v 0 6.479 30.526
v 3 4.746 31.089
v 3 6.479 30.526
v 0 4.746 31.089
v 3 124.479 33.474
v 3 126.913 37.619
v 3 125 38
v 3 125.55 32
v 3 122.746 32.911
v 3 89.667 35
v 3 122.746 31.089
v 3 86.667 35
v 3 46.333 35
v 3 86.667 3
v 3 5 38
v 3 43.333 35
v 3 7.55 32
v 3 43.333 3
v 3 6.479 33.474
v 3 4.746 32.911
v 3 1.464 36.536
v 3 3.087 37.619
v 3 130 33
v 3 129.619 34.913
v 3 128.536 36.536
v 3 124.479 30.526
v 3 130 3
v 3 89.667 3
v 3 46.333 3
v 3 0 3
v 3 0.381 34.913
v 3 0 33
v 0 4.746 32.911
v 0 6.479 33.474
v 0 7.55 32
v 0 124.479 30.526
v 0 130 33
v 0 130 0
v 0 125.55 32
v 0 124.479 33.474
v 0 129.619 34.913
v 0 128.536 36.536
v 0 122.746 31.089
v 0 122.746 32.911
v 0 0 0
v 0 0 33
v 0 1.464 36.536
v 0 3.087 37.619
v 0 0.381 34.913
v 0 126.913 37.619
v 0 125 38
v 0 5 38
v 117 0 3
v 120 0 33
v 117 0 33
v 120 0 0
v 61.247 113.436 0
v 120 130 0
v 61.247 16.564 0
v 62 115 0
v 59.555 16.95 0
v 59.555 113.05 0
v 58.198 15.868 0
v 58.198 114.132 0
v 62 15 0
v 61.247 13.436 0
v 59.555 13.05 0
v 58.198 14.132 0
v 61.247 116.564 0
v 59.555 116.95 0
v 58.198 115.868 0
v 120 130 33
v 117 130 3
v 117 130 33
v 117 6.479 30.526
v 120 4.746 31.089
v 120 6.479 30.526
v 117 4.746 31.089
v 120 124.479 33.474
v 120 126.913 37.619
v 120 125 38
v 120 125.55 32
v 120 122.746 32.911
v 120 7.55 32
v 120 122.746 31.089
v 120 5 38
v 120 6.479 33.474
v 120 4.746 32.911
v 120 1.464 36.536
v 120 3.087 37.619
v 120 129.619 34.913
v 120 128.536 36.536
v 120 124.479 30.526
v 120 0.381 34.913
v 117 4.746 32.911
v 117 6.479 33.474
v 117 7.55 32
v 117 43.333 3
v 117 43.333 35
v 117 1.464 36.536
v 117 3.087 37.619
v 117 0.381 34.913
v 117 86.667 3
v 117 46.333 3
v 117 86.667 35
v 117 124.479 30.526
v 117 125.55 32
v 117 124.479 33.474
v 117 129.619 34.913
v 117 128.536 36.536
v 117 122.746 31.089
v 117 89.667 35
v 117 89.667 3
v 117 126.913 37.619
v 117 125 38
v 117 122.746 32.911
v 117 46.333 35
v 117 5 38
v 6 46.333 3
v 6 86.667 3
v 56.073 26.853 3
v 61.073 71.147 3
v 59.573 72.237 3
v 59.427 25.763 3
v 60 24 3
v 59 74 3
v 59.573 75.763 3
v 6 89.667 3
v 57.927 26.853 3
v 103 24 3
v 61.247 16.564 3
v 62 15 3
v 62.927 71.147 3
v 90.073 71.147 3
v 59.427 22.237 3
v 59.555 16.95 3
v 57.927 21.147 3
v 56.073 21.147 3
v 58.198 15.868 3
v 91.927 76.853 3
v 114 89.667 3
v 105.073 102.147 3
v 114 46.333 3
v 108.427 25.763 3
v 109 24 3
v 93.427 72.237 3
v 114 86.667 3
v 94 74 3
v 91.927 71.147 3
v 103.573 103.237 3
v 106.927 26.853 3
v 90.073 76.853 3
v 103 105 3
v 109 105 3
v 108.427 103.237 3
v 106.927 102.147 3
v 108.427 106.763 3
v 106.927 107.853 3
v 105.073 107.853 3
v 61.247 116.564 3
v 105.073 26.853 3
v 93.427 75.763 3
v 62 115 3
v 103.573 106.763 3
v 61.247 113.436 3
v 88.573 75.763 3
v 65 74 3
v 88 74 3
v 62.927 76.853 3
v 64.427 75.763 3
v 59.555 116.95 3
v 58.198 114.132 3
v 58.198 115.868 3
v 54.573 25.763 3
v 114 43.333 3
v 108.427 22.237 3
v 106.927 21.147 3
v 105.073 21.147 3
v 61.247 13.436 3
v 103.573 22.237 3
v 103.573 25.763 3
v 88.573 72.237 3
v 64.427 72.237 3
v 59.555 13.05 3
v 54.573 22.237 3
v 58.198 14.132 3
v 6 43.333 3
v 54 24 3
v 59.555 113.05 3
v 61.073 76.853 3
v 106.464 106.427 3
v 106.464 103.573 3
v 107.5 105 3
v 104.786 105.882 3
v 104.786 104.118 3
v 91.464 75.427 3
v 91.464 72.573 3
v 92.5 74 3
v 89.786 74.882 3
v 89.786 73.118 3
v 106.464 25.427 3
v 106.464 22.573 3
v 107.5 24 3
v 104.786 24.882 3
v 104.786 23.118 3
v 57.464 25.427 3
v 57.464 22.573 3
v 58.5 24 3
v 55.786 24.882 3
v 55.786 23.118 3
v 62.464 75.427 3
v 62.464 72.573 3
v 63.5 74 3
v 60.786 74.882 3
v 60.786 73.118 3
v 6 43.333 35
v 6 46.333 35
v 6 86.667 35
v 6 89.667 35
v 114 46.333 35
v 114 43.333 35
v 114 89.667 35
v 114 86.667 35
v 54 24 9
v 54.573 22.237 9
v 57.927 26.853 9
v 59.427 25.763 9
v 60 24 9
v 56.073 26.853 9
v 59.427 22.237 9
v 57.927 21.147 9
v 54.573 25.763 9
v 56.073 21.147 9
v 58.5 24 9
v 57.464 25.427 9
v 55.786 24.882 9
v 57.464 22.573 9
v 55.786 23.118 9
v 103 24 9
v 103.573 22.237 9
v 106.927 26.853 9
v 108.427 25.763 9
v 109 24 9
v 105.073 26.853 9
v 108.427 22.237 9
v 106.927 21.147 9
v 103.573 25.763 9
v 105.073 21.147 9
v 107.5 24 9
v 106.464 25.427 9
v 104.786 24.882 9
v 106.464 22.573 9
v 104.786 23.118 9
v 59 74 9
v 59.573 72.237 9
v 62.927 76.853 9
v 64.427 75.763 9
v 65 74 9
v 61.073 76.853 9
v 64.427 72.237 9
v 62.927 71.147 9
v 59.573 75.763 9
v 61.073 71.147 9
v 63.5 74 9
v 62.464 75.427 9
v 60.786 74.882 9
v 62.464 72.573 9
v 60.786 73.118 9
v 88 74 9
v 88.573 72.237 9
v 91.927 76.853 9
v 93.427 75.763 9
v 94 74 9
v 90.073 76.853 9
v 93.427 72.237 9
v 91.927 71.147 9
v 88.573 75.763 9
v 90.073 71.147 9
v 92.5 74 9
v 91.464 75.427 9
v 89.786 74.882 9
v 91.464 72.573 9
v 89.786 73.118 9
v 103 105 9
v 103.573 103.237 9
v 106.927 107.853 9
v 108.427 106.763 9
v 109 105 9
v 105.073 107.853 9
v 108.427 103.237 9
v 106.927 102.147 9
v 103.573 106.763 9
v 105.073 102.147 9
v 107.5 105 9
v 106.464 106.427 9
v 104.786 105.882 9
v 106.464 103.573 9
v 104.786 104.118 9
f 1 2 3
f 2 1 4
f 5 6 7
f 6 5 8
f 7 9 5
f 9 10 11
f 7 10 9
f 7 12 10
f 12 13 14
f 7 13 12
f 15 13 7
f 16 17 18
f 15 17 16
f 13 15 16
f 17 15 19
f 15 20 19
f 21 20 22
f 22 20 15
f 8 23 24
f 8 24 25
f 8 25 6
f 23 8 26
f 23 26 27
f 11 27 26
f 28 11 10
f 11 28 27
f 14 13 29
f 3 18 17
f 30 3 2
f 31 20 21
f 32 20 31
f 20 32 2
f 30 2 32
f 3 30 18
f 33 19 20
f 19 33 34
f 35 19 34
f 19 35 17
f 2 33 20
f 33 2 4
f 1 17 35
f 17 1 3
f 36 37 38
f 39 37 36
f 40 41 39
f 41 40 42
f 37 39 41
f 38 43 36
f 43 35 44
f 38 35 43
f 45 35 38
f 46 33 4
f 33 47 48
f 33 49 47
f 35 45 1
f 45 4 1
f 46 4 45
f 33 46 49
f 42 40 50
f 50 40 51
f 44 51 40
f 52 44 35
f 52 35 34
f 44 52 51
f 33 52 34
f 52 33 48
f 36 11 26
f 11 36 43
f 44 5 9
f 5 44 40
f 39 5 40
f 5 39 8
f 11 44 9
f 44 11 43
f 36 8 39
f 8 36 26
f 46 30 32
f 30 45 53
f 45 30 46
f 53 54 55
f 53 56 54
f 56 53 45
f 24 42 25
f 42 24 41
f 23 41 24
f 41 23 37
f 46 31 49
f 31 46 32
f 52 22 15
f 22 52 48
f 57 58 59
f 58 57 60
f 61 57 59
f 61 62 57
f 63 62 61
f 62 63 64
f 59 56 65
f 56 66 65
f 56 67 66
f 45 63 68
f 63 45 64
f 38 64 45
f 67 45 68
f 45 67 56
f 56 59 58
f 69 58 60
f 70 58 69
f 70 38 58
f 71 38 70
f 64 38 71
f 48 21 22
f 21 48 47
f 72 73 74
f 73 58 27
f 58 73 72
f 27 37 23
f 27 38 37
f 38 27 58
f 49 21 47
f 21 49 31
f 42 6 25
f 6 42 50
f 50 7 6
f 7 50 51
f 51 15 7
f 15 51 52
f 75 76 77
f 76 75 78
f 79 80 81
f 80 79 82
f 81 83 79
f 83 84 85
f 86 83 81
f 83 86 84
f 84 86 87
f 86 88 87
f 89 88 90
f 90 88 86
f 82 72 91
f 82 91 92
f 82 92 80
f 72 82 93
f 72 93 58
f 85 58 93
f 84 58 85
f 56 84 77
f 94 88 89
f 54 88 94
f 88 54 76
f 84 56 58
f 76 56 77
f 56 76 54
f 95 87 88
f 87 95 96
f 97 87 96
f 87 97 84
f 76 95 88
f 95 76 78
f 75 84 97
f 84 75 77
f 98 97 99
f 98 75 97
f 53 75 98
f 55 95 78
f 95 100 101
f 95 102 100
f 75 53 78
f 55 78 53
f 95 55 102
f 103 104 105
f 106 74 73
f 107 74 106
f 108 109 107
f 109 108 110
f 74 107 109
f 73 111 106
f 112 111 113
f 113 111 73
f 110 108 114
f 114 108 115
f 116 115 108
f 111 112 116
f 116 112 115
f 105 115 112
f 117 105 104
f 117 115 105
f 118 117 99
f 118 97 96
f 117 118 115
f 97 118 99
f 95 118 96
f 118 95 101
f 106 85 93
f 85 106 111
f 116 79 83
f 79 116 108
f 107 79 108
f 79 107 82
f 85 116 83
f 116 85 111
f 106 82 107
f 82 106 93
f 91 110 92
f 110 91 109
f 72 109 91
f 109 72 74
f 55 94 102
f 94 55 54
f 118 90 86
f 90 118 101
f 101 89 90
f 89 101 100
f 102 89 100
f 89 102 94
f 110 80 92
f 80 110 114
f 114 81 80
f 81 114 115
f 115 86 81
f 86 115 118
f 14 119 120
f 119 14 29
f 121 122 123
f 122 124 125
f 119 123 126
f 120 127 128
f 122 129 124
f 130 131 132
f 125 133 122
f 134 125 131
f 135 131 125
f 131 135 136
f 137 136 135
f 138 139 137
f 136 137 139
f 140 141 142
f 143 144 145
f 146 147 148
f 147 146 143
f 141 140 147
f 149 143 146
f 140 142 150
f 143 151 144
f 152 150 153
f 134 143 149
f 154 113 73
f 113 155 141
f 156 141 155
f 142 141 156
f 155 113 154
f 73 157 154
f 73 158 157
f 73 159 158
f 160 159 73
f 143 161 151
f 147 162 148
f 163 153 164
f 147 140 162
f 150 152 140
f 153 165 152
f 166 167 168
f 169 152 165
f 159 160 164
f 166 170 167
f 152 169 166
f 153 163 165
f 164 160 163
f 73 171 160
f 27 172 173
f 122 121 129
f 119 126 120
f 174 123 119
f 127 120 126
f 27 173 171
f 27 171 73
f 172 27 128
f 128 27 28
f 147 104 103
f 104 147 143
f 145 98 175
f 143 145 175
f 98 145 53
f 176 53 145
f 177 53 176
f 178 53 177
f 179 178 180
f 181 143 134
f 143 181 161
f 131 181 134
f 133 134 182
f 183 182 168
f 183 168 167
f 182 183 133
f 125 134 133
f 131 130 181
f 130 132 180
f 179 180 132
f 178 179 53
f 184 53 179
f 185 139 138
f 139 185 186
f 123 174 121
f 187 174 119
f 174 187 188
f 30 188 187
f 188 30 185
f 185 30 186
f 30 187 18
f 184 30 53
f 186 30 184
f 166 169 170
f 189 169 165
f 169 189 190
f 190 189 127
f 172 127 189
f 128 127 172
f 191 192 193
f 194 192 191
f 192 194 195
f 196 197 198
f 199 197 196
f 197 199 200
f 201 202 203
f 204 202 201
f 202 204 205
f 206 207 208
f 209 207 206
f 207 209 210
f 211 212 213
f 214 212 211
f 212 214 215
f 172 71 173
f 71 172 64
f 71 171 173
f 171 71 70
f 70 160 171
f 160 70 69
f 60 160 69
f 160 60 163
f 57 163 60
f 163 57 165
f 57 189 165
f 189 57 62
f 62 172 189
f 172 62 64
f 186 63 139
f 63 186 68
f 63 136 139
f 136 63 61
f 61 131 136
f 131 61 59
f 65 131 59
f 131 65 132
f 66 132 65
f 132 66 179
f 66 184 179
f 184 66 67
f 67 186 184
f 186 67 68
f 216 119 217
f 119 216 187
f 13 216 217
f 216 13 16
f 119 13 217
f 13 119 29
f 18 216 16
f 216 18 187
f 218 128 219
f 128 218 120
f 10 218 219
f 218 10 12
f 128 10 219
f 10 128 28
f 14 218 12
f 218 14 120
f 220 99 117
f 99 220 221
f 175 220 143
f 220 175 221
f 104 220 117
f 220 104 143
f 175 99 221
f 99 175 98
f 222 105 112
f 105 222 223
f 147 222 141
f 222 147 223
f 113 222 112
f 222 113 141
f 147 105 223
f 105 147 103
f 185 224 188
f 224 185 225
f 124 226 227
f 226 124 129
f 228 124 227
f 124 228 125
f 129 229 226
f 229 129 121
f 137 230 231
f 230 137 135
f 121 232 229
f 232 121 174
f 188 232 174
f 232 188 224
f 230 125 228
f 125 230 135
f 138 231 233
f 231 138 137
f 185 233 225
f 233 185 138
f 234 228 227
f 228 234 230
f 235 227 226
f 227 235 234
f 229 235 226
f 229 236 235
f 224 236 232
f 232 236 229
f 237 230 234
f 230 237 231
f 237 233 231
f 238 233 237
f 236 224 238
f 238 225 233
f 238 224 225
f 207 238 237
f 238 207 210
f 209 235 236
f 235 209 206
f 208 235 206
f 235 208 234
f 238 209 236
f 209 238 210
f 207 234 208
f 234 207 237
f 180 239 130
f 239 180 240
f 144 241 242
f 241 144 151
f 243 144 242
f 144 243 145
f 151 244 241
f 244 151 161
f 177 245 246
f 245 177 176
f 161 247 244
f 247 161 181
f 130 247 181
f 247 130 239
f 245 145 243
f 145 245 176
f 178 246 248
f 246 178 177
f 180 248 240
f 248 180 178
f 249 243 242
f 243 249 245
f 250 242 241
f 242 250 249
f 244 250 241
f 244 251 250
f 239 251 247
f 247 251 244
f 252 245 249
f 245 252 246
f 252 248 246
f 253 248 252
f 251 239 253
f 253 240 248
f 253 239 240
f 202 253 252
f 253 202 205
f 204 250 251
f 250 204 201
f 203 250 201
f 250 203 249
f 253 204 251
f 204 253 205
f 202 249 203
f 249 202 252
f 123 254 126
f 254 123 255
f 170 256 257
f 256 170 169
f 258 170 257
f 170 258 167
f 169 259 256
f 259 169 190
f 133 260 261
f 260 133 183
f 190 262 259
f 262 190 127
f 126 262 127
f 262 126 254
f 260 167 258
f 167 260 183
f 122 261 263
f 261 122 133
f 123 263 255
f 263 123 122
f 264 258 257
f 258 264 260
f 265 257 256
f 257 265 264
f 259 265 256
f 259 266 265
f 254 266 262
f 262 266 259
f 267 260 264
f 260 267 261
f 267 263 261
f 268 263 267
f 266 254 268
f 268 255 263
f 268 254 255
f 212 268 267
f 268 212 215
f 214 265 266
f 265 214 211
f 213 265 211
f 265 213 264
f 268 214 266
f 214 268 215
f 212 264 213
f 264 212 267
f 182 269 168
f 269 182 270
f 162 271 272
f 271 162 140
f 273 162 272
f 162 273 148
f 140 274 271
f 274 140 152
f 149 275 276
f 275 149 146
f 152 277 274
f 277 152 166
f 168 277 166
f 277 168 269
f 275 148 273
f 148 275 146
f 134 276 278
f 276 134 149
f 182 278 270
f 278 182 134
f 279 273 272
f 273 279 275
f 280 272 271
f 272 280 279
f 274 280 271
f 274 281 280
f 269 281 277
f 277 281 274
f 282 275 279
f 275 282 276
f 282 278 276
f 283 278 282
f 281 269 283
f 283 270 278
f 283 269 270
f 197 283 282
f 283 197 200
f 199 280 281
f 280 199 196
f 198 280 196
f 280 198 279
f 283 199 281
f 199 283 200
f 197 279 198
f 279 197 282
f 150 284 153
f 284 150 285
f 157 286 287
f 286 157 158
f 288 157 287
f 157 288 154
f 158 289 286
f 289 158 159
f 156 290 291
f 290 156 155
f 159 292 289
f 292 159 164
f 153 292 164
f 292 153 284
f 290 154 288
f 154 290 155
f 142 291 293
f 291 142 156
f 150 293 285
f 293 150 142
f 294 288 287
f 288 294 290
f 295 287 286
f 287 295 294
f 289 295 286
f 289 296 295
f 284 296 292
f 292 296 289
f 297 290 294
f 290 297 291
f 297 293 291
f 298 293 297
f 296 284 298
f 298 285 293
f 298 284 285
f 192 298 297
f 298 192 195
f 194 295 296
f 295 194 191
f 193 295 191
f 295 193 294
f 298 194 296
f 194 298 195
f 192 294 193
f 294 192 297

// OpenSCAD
//tc electronic box: 74x130x38, rozstaw śrub 100

box_wall=3;
box_width=126-box_wall*2;
box_depth=130;
box_height=38;
box_radius=5;

module power_socket() {
    cylinder(h=box_wall, d=8.5);
}

module jack_socket() {
    cylinder(h=box_wall*2, d=9.5);
}

module switch_socket() {
    cylinder(h=box_wall*2, d=6.5);
}

module led_socket() {
    cylinder(h=box_wall*2, d=8);
}

module trs_socket() {
    cylinder(h=box_wall*2, d=8);
}

module rounded_square(width, height, radius) {
    hull() {
        translate([radius, radius, 0]) {
            circle(r=radius);
        }
        translate([width-radius, radius, 0]) {
            circle(r=radius);
        }
        translate([radius, height-radius, 0]) {
            circle(r=radius);
        }
        translate([width-radius, height-radius, 0]) {
            circle(r=radius);
        }
    }
}

module bottom_side(width, height, radius, wall, with_holes=false) {
    rotate([90,0,90]) {
        difference() {
            linear_extrude(wall) {
                hull() {
                    translate([radius, height - radius]) {
                        circle(radius);
                    }
                    translate([width-radius, height-radius]) {
                        circle(radius);
                    }
                    translate([width-radius, 0]) {
                        square(radius, radius);
                    }
                    square(radius, radius);
                }
            }

            if (with_holes) {
                translate([6,box_height-6,0]) {
                    cylinder(h=box_wall, d=3.1);
                }
                translate([box_depth-6,box_height-6,0]) {
                    cylinder(h=box_wall, d=3.1);
                }
            }
        }
    }
}



module bottom_part() {
    bottom_side(box_depth,box_height,box_radius,box_wall, with_holes=true);

    translate([box_width-box_wall,0,0]) {
        bottom_side(box_depth,box_height,box_radius,box_wall, with_holes=true);
    }

    linear_extrude(box_wall) {
        difference() {
            square([box_width, box_depth]);
            translate([box_width/2, box_depth/2-50,0]) {
                circle(d=4);
            }
            translate([box_width/2, box_depth/2+50,0]) {
                circle(d=4);
            }
        }
    }

    //pillars
    translate([box_wall,box_depth/3,box_wall]) {
        cube([box_wall,box_wall,box_height-box_wall*2]);
    }

    translate([box_wall,box_depth/3*2,box_wall]) {
        cube([box_wall,box_wall,box_height-box_wall*2]);
    }

    translate([box_width-box_wall*2,box_depth/3,box_wall]) {
        cube([box_wall,box_wall,box_height-box_wall*2]);
    }

    translate([box_width-box_wall*2,box_depth/3*2,box_wall]) {
        cube([box_wall,box_wall,box_height-box_wall*2]);
    }
}

module top_mount() {
    difference() {
        cylinder(h=box_width-box_wall*2, d=7);
        cylinder(h=box_width-box_wall*2, d=3.1);
    }
}

module lipo_hole() {
    cube([23.5+4,28.5+4,box_wall*2], center=true);
}

module lipo_cap() {
    difference() {
        cube([23.5+4,28.5+4,4], center=true);
        cube([23.5,28.5,4], center=true);
    }

    translate([0,0,2]) {
        cube([23.5+6,28.5+6,1], center=true);
    }
}

module top_part() {
    translate([box_wall, 6, box_height-6]) {
        rotate([0,90,0]) {
            difference() {
                top_mount();
            }
        }
    }

    translate([box_wall, box_depth-6, box_height-6]) {
        rotate([0,90,0]) {
            difference() {
                top_mount();
            }
        }
    }

    difference() {
        translate([box_wall,0,box_wall]) {
            bottom_side(box_depth, box_height-box_wall, box_radius, box_width-box_wall*2);
        }

        translate([box_wall,box_wall,box_wall]) {
            bottom_side(box_depth-box_wall*2, box_height-box_wall*2, box_radius, box_width-box_wall*2);
        }

        /* bottom sockets
        translate([box_width/2,box_wall,box_height/3]) {
            rotate([90,0,0]) {
                power_socket();
            }
        }
        */

        //top sockets
    }
}

module top_part_fs_rf_relay() {
    difference() {
        top_part();

        rotate([90,0,0]) {
            translate([box_width-15, box_height/2, -box_depth]) {
                power_socket();
            }

            translate([15, box_height/2, -box_depth]) {
                jack_socket();
            }
        }

        translate([box_width/2,box_depth-40, box_height-box_wall*2]) {
            switch_socket();
        }

        translate([box_width/2,box_depth-52, box_height-box_wall*2]) {
            led_socket();
        }

        translate([25,box_depth-32,box_height-1]) {
            linear_extrude(1) {
                text("On/Off", size=4);
            }
        }

        translate([12,box_depth-10,box_height-1]) {
            linear_extrude(1) {
                text("FS", size=3);
            }
        }

        translate([box_width-23,box_depth-10,box_height-1]) {
            linear_extrude(1) {
                text("DC (9V)", size=3);
            }
        }
    }
}


module top_part_fxloop_rf_relay() {
    difference() {
        top_part();

        //top sockets
        rotate([90,0,0]) {
            translate([box_width-15, box_height/2, -box_depth]) {
                jack_socket();
            }

            translate([box_width/2, box_height/2, -box_depth]) {
                power_socket();
            }

            translate([15, box_height/2, -box_depth]) {
                jack_socket();
            }
        }

        translate([27,box_depth-10,box_height-1]) {
            linear_extrude(1) {
                text("DC (9V)", size=3);
            }
        }

        translate([11,box_depth-10,box_height-1]) {
            linear_extrude(1) {
                text("S-IN", size=3);
            }
        }

        translate([box_width-18,box_depth-10,box_height-1]) {
            linear_extrude(1) {
                text("R-IN", size=3);
            }
        }

        //plate sockets
        translate([box_width/2,box_depth-40, box_height-box_wall*2]) {
            switch_socket();
        }

        translate([box_width/2,box_depth-52, box_height-box_wall*2]) {
            led_socket();
        }

        translate([25,box_depth-32,box_height-1]) {
            linear_extrude(1) {
                text("On/Off", size=4);
            }
        }

        //bottom sockets
        rotate([90,0,0]) {
            translate([box_width-15, box_height/2, 0]) {
                jack_socket();
            }

            translate([15, box_height/2, 0]) {
                jack_socket();
            }
        }

        translate([8,10,box_height-1]) {
            linear_extrude(1) {
                text("S-OUT", size=3);
            }
        }

        translate([box_width-21,10,box_height-1]) {
            linear_extrude(1) {
                text("R-OUT", size=3);
            }
        }
    }
}

module top_part_power() {
    /*
    translate([box_width-box_wall,10,box_height- box_wall]) {
        rotate([270,0,90]) {
            pcb_mount(17.5,box_width-box_wall*2,3);
        }
    }*/

    difference() {
        top_part();

        rotate([90,0,0]) {
            translate([box_width/2, box_height/2, -box_depth]) {
                power_socket();
            }
        }

        translate([box_width/2,box_depth-30, box_height-box_wall*2]) {
            switch_socket();
        }

        translate([14,box_depth-10,box_height-1]) {
            linear_extrude(1) {
                text("DC OUT (9V, - inside)", size=4);
            }
        }

        rotate([90,0,0]) {
            translate([box_width/2, box_height/2, -box_wall]) {
                power_socket();
            }
        }

        translate([11,10,box_height-1]) {
            linear_extrude(1) {
                text("CHARGE (5V, + inside)", size=4);
            }
        }

        translate([box_width/2,box_depth-60,box_height-box_wall]) {
            lipo_hole();
        }
    }
}


//top_part_fs_rf_relay();

//top_part_fxloop_rf_relay();

//top_part_power();

//lipo_cap();

//top_part_power();

//bottom_power();

module screw_socket() {
    difference() {
        cylinder(h=box_wall*2, d=6);
        cylinder(h=box_wall*2, d=3);
    }
}

module pca10040_mount() {
    
    %cube([64,101,1]);
   
    
    translate([6+2,14+2,0]) {
        screw_socket();
    }
    
    translate([55+2,14+2,0]) {
        screw_socket();
    }
    
    translate([11+2,64+2,0]) {
        screw_socket();
    }
    
    translate([40+2,64+2,0]) {
        screw_socket();
    }
    
    translate([55+2,95+2,0]) {
        screw_socket();
    }
}

module battery_holder() {
    cube([20,75,16]);
}

module bottom_midi() {
    bottom_part();
    translate([7+20+1+20+1,8,box_wall]) {
        pca10040_mount();
    }

    %translate([7,30,box_wall]) {
        battery_holder();
    }

    %translate([7+20+1,30,box_wall]) {
        battery_holder();
    }
}


//bottom_midi();

module top_midi() {
    difference() {
        top_part();
        
        rotate([90,0,0]) {
            translate([box_width/2-22.5, box_height/2, -box_depth]) {
                power_socket();
            }
        }
        
        rotate([90,0,0]) {
            translate([box_width/2+22.5, box_height/2, -box_depth]) {
                trs_socket();
            }
        }

        translate([box_width/2,box_depth-20, box_height-box_wall*2]) {
            switch_socket();
        }
        
        translate([box_width/2-45,box_depth-20, box_height-box_wall*2]) {
            switch_socket();
        }
        
        translate([box_width/2+45,box_depth-20, box_height-box_wall*2]) {
            switch_socket();
        }
        
        
        translate([box_width/2, 20, box_height-box_wall*2]) {
            switch_socket();
        }
        
        translate([box_width/2-45, 20, box_height-box_wall*2]) {
            switch_socket();
        }
        
        translate([box_width/2+45, 20, box_height-box_wall*2]) {
            switch_socket();
        }

        /*
        translate([25,box_depth-32,box_height-1]) {
            linear_extrude(1) {
                text("On/Off", size=4);
            }
        }

        translate([12,box_depth-10,box_height-1]) {
            linear_extrude(1) {
                text("FS", size=3);
            }
        }

        translate([box_width-23,box_depth-10,box_height-1]) {
            linear_extrude(1) {
                text("DC (9V)", size=3);
            }
        }
        */
    }
}


bottom_midi();

%top_midi();
